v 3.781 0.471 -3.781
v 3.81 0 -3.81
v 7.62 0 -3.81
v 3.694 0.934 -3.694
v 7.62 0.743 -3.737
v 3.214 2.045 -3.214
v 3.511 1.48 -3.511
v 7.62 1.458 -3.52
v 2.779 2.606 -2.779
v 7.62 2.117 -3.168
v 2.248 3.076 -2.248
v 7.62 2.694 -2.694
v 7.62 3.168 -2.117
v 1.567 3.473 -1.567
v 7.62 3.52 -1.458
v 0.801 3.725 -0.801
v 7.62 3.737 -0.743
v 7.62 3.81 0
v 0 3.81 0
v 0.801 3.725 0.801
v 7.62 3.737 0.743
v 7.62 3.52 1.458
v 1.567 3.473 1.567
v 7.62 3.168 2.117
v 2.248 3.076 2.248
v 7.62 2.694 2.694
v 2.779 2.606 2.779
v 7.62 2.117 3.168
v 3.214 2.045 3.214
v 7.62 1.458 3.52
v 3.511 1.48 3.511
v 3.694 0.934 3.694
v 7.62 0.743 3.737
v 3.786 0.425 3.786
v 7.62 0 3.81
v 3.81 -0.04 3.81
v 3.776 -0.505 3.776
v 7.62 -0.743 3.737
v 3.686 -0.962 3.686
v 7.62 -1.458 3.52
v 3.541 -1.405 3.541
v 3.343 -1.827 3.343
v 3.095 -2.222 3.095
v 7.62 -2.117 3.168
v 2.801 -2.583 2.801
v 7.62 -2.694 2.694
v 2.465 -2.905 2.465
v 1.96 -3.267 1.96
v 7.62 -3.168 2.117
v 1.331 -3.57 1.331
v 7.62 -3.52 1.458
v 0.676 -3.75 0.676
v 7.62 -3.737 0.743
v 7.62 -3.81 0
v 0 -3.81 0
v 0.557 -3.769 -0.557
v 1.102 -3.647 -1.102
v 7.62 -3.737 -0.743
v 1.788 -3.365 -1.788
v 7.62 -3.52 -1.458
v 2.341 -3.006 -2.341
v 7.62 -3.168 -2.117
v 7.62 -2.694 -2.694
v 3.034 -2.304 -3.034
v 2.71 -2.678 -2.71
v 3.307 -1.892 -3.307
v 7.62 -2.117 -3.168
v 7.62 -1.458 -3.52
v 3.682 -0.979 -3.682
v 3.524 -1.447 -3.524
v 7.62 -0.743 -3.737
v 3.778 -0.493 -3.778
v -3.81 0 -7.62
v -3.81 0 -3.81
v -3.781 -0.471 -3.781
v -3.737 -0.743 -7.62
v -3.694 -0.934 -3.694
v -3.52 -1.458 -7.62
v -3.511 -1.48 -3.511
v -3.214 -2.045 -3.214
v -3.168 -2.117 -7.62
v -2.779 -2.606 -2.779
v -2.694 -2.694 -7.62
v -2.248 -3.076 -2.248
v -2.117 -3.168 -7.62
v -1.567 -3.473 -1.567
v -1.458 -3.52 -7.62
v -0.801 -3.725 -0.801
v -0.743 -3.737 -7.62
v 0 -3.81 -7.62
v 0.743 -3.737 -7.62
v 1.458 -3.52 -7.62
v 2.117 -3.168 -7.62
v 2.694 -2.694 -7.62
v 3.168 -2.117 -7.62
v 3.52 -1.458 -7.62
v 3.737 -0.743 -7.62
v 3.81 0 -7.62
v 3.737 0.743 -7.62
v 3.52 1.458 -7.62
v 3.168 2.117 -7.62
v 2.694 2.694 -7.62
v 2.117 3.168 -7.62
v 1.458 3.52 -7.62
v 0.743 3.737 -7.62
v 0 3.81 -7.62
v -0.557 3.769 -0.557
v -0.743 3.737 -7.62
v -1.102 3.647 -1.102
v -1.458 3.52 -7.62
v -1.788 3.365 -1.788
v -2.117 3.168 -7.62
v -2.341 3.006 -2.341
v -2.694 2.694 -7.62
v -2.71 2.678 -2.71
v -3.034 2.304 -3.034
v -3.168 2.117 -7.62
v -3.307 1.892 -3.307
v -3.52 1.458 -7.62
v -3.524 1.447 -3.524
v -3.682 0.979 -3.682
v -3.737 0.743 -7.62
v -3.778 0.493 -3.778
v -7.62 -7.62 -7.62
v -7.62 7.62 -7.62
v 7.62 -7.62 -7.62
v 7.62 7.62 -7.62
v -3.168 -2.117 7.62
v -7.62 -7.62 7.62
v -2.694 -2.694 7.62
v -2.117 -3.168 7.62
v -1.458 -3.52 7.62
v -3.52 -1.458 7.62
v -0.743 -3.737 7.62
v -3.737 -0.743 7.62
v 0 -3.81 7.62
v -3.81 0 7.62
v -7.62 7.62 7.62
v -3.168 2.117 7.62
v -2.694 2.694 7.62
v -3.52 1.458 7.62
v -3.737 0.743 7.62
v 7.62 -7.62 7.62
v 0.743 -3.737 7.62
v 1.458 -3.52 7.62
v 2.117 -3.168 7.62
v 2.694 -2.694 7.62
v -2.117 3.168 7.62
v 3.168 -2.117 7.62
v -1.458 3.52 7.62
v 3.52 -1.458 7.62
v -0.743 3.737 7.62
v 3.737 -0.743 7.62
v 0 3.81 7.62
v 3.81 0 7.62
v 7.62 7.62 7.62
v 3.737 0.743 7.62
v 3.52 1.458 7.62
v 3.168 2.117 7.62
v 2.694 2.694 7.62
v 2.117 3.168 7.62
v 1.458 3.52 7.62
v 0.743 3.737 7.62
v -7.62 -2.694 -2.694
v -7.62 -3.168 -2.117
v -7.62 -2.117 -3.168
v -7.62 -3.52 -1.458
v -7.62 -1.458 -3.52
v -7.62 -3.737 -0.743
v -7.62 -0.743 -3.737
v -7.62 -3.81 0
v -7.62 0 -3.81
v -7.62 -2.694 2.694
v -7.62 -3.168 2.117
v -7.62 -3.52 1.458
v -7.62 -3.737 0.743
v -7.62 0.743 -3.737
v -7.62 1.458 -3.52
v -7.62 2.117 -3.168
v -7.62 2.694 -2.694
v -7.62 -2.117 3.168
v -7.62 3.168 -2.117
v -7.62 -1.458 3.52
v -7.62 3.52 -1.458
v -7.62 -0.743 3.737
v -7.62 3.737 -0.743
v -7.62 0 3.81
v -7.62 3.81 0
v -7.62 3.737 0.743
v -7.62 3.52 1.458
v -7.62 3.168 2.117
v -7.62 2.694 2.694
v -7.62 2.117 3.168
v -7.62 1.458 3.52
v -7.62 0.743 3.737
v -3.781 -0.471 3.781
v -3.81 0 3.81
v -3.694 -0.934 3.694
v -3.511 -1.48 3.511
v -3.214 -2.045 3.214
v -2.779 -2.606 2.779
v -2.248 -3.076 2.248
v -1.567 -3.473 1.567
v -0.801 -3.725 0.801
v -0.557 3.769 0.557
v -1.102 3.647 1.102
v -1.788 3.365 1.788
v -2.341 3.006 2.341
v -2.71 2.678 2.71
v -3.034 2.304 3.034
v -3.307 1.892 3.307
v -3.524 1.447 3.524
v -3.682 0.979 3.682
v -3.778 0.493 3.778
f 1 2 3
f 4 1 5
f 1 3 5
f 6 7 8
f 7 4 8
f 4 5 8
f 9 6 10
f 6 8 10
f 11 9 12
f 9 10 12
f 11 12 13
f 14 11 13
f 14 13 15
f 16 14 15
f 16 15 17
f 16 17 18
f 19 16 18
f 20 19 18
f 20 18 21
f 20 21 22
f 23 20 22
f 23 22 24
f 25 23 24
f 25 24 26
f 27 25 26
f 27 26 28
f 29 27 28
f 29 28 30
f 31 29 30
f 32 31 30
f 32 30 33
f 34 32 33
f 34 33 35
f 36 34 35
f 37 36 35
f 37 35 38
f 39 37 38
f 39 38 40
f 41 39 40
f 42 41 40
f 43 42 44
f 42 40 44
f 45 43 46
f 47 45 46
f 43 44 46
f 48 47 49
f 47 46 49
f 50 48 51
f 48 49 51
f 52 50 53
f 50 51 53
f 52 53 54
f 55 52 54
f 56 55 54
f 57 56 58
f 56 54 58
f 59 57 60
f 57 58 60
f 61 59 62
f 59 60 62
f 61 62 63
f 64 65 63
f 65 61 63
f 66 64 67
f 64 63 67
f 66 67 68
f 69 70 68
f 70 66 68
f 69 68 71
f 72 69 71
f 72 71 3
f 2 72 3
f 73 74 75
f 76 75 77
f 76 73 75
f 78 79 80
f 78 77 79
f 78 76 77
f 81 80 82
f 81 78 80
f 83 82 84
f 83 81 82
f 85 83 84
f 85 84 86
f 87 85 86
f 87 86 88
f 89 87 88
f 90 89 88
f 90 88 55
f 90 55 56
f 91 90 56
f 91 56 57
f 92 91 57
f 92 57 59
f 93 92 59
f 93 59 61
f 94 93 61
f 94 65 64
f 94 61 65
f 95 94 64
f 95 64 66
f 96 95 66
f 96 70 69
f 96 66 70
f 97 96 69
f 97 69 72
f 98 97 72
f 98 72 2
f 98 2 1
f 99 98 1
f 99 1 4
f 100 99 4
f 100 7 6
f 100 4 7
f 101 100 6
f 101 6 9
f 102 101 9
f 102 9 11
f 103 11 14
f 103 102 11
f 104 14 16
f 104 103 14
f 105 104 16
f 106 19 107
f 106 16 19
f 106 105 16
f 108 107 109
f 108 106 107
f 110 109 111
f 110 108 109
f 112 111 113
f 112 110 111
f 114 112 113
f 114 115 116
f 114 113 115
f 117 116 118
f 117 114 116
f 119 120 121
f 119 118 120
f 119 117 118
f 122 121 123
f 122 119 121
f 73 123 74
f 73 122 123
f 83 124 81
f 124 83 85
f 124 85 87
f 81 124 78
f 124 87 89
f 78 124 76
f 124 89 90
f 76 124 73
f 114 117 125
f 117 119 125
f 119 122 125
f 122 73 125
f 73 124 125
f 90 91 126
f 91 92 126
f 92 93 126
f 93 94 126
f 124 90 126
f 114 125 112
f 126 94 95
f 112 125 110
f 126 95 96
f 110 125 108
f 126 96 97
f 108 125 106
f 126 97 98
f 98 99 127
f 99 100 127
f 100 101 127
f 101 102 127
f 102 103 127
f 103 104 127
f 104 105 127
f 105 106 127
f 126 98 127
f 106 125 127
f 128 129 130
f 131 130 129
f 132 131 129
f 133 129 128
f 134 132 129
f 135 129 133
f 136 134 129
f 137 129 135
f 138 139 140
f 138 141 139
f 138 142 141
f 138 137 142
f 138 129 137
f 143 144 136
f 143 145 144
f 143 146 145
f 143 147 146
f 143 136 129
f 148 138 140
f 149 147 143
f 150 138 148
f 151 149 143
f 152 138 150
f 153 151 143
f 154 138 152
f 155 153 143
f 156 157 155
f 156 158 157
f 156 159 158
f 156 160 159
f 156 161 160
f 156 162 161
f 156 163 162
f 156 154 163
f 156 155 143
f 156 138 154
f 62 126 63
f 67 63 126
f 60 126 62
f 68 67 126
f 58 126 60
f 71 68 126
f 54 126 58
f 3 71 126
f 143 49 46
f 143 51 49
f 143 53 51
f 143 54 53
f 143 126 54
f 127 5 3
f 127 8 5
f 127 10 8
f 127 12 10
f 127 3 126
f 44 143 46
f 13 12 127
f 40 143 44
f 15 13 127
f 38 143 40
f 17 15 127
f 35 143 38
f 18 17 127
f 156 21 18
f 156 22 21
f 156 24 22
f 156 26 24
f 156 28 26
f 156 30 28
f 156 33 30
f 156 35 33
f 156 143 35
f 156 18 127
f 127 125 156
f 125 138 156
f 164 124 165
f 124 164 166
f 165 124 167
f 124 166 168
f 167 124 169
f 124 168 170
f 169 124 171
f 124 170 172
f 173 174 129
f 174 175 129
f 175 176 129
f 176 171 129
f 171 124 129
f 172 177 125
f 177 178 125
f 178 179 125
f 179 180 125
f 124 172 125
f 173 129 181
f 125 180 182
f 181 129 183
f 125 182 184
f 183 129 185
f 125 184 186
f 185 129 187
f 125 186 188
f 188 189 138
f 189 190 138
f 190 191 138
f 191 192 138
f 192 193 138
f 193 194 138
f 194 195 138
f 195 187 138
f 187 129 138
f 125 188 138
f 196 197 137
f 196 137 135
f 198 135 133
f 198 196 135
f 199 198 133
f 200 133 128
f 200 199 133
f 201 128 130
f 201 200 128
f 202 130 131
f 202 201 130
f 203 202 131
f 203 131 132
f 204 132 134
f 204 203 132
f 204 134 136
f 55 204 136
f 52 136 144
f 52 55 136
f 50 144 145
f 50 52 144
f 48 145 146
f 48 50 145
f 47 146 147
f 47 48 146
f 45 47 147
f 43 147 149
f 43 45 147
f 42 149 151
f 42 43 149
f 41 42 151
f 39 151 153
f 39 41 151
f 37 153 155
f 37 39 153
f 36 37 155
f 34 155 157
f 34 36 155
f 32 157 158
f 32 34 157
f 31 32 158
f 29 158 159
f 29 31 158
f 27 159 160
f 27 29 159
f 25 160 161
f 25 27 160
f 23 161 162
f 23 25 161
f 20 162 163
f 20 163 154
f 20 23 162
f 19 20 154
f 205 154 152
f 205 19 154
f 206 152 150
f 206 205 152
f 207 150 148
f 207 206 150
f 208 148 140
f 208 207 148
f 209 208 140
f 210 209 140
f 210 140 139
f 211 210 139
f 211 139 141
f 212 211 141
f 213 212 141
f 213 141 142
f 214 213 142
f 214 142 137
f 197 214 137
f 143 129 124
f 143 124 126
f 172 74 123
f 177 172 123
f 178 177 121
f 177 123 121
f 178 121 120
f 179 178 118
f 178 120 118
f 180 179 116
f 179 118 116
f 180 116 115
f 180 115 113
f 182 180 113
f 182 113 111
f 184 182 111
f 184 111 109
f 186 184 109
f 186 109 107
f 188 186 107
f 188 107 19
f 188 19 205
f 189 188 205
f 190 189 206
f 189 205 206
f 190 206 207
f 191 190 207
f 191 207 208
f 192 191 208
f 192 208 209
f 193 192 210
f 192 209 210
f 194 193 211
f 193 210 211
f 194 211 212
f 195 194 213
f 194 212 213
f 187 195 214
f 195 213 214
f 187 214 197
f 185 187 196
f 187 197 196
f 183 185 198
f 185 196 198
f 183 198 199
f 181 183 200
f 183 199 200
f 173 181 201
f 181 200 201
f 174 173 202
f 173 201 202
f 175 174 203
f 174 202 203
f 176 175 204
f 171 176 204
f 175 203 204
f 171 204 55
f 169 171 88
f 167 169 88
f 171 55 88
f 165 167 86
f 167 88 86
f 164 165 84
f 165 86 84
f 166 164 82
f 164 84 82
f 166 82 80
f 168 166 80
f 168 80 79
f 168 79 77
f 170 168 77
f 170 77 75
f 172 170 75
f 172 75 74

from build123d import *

# Parameters (mm, degrees)
SKETCH1_W          = 19.05
SKETCH1_H          = 19.05
SKETCH1_R          = 4.7625
BASE_EXTRUDE_DEPTH = 9.525
SKETCH3_R          = 4.7625
CUT_EXTRUDE1_DEPTH = 24.3313898
SCALE1_SCALE       = 0.8


with BuildPart() as part:
    # Sketch1 → Base-Extrude (new, symmetric)
    with BuildSketch(Plane.XY):
        Rectangle(SKETCH1_W, SKETCH1_H)
        with Locations(Location((0, 0, 0), (0, 0, 180))):
            Circle(SKETCH1_R, mode=Mode.SUBTRACT)
    extrude(amount=BASE_EXTRUDE_DEPTH, both=True)

    # Sketch3 → Cut-Extrude1 (cut, through all)
    with BuildSketch(Plane(origin=(9.525, 0, 0), x_dir=(0, 0, -1), z_dir=(1, 0, 0))):
        Circle(SKETCH3_R)
    extrude(amount=-CUT_EXTRUDE1_DEPTH, mode=Mode.SUBTRACT)


with BuildPart() as part_1:
    # Scale1: scaled about (0, 0, 0)
    add(part.part.scale(SCALE1_SCALE))


solid = part_1.part
